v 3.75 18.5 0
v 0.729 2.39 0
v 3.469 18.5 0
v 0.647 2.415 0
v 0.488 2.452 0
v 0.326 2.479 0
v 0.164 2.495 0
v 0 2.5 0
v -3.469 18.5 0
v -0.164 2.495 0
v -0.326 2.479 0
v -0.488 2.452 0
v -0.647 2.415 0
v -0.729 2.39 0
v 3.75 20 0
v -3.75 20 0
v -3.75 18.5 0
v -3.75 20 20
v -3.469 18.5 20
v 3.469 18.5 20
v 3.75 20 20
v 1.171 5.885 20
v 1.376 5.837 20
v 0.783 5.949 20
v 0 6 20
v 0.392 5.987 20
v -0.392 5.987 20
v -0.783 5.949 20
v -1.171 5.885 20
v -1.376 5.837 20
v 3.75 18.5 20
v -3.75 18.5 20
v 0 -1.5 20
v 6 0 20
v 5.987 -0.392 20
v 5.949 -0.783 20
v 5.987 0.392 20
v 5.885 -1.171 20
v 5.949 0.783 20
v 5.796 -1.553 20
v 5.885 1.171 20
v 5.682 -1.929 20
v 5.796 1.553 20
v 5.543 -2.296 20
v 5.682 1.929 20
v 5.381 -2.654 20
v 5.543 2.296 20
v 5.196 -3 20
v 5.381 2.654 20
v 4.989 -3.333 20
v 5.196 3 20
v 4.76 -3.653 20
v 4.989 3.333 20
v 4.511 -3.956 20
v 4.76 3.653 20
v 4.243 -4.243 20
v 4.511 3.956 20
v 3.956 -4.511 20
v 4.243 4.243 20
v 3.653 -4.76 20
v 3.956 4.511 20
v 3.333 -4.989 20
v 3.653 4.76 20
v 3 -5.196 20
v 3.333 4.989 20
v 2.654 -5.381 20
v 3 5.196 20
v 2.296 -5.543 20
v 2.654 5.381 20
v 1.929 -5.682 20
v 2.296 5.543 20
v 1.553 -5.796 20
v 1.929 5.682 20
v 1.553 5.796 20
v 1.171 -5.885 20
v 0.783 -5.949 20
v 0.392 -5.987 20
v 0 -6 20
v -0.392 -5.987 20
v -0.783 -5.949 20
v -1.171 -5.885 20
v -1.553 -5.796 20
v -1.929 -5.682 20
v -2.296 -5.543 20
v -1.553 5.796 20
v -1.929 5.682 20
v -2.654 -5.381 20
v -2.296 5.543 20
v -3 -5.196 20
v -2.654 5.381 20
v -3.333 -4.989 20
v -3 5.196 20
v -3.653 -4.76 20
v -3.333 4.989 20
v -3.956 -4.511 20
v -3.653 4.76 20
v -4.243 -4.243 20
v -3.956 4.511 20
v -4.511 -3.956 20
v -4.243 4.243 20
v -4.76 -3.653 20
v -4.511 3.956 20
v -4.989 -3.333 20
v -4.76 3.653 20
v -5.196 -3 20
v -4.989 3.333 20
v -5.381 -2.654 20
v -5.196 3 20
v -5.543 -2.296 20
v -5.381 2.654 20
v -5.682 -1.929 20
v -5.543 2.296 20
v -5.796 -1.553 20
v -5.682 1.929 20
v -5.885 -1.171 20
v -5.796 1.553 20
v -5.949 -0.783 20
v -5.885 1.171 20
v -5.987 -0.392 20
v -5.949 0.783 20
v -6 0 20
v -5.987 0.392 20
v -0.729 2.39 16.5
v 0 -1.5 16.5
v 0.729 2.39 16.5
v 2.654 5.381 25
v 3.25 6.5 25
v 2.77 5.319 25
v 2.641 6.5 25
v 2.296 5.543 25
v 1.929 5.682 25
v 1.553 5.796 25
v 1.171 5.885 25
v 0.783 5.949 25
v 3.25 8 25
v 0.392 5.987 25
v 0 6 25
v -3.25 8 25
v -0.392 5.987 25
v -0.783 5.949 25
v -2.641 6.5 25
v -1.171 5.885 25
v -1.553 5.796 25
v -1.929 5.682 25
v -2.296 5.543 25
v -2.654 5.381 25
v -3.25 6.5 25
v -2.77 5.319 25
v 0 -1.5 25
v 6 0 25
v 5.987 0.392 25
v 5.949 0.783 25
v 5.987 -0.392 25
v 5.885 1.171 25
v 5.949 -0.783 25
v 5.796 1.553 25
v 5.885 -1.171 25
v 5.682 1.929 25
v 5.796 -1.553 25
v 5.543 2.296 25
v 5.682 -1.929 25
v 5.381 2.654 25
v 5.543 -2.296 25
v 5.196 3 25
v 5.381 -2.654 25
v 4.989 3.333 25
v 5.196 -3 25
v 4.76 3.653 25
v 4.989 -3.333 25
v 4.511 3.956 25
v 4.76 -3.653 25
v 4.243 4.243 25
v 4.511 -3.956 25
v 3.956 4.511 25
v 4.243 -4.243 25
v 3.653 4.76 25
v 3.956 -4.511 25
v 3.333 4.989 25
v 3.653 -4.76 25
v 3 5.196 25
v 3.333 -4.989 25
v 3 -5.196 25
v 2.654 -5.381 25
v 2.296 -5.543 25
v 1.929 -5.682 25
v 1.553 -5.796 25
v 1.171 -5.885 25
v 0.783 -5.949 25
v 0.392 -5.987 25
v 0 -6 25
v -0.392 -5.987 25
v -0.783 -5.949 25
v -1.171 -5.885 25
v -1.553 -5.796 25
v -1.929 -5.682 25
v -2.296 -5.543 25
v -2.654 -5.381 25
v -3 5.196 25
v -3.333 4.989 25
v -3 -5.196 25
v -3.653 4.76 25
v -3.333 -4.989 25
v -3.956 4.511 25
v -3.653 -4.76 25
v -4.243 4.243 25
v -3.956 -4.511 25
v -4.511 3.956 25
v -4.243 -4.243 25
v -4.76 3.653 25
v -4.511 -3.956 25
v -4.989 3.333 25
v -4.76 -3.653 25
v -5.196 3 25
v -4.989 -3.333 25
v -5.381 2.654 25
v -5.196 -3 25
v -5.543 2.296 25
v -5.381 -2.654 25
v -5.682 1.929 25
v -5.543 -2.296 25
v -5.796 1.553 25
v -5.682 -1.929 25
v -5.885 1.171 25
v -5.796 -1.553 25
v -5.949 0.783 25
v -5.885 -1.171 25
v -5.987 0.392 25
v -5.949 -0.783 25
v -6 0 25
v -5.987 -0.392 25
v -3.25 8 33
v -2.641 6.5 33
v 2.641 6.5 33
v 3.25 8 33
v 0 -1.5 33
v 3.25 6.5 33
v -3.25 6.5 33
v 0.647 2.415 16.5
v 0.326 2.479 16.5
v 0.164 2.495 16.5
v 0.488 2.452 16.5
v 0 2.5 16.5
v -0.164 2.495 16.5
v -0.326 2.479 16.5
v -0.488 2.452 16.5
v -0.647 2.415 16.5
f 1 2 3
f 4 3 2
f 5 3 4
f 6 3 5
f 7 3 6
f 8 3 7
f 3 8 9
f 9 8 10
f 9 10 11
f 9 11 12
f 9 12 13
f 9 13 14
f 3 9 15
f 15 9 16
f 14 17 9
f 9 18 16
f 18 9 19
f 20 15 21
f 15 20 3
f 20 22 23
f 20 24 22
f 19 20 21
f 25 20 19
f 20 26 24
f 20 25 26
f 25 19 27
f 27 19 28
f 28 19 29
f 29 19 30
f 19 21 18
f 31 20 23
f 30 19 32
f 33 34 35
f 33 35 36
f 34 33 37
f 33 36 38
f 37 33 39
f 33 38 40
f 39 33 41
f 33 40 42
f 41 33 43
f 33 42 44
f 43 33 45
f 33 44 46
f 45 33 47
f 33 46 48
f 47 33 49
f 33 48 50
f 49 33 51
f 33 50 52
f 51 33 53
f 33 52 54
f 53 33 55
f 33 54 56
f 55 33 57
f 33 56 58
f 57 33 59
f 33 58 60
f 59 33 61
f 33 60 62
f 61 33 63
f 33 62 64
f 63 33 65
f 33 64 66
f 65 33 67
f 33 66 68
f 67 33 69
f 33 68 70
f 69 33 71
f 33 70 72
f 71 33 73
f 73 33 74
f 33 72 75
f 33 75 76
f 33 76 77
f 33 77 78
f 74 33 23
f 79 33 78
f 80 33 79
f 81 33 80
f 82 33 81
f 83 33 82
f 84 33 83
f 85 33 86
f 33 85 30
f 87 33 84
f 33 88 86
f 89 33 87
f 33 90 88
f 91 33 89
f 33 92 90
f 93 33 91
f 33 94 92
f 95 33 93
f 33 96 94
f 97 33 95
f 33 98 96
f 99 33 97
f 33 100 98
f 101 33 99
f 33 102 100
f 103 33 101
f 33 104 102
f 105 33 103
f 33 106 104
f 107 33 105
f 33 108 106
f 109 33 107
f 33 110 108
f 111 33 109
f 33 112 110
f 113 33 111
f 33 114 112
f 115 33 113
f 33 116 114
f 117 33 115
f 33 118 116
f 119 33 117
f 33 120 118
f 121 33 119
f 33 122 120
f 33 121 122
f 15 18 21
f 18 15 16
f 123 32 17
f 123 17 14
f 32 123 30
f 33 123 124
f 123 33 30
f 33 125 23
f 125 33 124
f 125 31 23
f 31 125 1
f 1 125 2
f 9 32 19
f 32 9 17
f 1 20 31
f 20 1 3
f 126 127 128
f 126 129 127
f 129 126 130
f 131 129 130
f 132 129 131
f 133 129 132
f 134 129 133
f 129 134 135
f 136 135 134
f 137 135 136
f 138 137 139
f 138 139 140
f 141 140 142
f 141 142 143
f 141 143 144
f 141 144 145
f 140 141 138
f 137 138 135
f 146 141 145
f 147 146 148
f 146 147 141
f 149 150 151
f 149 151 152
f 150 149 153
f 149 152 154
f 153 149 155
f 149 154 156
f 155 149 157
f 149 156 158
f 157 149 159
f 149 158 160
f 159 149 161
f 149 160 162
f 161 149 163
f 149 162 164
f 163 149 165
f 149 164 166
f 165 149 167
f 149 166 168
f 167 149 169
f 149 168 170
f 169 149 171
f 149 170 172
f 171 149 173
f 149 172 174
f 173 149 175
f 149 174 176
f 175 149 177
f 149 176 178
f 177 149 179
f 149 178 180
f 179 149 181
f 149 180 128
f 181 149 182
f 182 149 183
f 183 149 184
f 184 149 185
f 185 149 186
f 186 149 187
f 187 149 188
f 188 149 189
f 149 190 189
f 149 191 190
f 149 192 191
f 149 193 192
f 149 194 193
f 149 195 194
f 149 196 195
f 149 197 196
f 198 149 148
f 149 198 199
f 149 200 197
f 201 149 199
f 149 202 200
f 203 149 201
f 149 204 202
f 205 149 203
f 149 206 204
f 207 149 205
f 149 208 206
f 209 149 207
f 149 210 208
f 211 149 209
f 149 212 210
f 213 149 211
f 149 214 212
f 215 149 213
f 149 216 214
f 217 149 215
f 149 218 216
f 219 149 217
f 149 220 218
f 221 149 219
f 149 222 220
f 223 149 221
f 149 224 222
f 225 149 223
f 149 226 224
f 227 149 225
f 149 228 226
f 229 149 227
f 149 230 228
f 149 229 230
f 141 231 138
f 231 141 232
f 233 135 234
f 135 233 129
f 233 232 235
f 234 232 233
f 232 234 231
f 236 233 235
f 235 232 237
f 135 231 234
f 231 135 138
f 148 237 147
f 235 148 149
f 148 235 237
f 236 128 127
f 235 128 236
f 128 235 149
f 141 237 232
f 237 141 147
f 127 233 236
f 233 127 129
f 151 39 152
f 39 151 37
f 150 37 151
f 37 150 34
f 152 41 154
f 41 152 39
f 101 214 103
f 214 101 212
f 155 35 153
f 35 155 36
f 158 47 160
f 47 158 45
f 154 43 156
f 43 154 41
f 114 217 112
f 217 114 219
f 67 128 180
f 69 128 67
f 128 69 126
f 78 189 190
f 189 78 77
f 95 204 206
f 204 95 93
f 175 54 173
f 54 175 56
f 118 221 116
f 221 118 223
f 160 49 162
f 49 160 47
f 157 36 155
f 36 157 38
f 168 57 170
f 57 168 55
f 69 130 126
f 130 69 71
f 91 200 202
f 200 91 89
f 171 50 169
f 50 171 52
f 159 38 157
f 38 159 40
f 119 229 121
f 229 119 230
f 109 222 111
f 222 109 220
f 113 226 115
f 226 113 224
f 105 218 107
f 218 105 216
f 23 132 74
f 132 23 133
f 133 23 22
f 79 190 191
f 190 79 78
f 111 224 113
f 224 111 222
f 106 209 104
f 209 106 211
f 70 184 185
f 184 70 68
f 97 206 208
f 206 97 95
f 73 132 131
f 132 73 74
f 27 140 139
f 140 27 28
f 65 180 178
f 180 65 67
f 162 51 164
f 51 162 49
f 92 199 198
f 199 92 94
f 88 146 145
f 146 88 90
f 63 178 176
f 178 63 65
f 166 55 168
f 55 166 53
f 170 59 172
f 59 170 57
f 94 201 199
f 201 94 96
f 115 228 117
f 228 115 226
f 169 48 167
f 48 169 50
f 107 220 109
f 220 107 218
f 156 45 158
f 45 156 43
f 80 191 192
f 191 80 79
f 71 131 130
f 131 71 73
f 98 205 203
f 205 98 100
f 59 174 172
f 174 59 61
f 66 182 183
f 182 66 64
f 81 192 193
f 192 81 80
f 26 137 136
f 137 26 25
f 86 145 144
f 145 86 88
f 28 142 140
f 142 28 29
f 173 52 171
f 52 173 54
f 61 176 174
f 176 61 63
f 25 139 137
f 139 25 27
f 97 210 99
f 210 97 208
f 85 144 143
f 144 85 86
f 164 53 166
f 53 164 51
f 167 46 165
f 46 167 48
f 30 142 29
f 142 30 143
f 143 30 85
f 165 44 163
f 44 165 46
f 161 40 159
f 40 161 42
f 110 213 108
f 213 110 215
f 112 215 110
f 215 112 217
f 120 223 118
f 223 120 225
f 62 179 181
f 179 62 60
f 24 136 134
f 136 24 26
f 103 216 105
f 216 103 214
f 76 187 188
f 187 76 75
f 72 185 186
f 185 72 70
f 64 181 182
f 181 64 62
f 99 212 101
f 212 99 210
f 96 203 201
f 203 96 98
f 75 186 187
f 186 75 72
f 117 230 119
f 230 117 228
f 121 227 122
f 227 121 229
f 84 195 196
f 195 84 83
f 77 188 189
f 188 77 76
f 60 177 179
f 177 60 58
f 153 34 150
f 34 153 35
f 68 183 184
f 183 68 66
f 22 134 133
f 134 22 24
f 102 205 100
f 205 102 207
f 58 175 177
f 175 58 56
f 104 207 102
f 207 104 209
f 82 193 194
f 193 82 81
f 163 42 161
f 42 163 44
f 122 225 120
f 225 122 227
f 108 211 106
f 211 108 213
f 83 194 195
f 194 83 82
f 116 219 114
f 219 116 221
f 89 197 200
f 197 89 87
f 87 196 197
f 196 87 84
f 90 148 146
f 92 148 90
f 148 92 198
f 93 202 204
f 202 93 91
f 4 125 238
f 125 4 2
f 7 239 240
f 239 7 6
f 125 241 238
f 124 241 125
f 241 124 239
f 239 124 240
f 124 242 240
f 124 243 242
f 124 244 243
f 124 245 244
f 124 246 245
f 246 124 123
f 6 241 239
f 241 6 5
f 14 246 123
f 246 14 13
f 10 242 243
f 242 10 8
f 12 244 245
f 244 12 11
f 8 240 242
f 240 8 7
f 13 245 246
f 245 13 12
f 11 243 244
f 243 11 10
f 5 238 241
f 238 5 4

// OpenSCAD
// Straight hose-barb reducer: 8 mm tubing (z = 0..20) -> collar (z = 20..25) -> 5 mm tubing (z = 25..41)
// Print orientation: standing upright along +Z, centred on the origin in X/Y.

// ---------------- Parameters ----------------
reducer_in     = 8;    // 8 mm tubing inner diameter (mm)
reducer_in_h   = 20;   // height of 8 mm tubing barbs (mm)
reducer_in_od  = 7.5;  // outer diameter of 8 mm barbs at bottom (mm)
reducer_in_od2 = 9.5;  // outer diameter of 8 mm barbs at top (mm)

reducer_coll   = 12;   // collar diameter (mm)
reducer_coll_h = 5;    // collar height (mm)

reducer_out    = 5;    // 5 mm tubing inner diameter (mm)
reducer_out_h  = 8;    // height of 5 mm tubing barbs (mm)
reducer_out_od = 6.5;  // outer diameter of 5 mm barbs at bottom (mm)
reducer_out_od2 = 5.0; // outer diameter of 5 mm barbs at top (mm)

eps = 0.5;             // overshoot for clean boolean cuts (mm)

$fn = 96;              // curve resolution

// ---------------- Derived ----------------
total_h = reducer_in_h + reducer_coll_h + reducer_out_h;   // 33 mm
pitch   = 1.5;                                             // barb-to-barb spacing (mm)

// ---------------- Model ----------------
difference() {
    union() {
        // 8 mm tubing barbs (z = 0..20)
        for (i = [0 : 1])
            translate([0, -pitch * i, 0])
                linear_extrude(height = reducer_in_h)
                    polygon([
                        [0, 0],
                        [reducer_in_od / 2, reducer_in_h],
                        [-reducer_in_od / 2, reducer_in_h]
                    ]);

        // Collar (z = 20..25)
        translate([0, 0, reducer_in_h])
            cylinder(d = reducer_coll, h = reducer_coll_h);

        // 5 mm tubing barbs (z = 25..33)
        for (i = [0 : 1])
            translate([0, -pitch * i, reducer_in_h + reducer_coll_h])
                linear_extrude(height = reducer_out_h)
                    polygon([
                        [0, 0],
                        [reducer_out_od / 2, reducer_out_h],
                        [-reducer_out_od / 2, reducer_out_h]
                    ]);
    }

    // Through bore (full length)
    translate([0, 0, -eps])
        linear_extrude(height = total_h + 2 * eps, center = true)
            circle(d = reducer_in < reducer_out ? reducer_in : reducer_out);
}
